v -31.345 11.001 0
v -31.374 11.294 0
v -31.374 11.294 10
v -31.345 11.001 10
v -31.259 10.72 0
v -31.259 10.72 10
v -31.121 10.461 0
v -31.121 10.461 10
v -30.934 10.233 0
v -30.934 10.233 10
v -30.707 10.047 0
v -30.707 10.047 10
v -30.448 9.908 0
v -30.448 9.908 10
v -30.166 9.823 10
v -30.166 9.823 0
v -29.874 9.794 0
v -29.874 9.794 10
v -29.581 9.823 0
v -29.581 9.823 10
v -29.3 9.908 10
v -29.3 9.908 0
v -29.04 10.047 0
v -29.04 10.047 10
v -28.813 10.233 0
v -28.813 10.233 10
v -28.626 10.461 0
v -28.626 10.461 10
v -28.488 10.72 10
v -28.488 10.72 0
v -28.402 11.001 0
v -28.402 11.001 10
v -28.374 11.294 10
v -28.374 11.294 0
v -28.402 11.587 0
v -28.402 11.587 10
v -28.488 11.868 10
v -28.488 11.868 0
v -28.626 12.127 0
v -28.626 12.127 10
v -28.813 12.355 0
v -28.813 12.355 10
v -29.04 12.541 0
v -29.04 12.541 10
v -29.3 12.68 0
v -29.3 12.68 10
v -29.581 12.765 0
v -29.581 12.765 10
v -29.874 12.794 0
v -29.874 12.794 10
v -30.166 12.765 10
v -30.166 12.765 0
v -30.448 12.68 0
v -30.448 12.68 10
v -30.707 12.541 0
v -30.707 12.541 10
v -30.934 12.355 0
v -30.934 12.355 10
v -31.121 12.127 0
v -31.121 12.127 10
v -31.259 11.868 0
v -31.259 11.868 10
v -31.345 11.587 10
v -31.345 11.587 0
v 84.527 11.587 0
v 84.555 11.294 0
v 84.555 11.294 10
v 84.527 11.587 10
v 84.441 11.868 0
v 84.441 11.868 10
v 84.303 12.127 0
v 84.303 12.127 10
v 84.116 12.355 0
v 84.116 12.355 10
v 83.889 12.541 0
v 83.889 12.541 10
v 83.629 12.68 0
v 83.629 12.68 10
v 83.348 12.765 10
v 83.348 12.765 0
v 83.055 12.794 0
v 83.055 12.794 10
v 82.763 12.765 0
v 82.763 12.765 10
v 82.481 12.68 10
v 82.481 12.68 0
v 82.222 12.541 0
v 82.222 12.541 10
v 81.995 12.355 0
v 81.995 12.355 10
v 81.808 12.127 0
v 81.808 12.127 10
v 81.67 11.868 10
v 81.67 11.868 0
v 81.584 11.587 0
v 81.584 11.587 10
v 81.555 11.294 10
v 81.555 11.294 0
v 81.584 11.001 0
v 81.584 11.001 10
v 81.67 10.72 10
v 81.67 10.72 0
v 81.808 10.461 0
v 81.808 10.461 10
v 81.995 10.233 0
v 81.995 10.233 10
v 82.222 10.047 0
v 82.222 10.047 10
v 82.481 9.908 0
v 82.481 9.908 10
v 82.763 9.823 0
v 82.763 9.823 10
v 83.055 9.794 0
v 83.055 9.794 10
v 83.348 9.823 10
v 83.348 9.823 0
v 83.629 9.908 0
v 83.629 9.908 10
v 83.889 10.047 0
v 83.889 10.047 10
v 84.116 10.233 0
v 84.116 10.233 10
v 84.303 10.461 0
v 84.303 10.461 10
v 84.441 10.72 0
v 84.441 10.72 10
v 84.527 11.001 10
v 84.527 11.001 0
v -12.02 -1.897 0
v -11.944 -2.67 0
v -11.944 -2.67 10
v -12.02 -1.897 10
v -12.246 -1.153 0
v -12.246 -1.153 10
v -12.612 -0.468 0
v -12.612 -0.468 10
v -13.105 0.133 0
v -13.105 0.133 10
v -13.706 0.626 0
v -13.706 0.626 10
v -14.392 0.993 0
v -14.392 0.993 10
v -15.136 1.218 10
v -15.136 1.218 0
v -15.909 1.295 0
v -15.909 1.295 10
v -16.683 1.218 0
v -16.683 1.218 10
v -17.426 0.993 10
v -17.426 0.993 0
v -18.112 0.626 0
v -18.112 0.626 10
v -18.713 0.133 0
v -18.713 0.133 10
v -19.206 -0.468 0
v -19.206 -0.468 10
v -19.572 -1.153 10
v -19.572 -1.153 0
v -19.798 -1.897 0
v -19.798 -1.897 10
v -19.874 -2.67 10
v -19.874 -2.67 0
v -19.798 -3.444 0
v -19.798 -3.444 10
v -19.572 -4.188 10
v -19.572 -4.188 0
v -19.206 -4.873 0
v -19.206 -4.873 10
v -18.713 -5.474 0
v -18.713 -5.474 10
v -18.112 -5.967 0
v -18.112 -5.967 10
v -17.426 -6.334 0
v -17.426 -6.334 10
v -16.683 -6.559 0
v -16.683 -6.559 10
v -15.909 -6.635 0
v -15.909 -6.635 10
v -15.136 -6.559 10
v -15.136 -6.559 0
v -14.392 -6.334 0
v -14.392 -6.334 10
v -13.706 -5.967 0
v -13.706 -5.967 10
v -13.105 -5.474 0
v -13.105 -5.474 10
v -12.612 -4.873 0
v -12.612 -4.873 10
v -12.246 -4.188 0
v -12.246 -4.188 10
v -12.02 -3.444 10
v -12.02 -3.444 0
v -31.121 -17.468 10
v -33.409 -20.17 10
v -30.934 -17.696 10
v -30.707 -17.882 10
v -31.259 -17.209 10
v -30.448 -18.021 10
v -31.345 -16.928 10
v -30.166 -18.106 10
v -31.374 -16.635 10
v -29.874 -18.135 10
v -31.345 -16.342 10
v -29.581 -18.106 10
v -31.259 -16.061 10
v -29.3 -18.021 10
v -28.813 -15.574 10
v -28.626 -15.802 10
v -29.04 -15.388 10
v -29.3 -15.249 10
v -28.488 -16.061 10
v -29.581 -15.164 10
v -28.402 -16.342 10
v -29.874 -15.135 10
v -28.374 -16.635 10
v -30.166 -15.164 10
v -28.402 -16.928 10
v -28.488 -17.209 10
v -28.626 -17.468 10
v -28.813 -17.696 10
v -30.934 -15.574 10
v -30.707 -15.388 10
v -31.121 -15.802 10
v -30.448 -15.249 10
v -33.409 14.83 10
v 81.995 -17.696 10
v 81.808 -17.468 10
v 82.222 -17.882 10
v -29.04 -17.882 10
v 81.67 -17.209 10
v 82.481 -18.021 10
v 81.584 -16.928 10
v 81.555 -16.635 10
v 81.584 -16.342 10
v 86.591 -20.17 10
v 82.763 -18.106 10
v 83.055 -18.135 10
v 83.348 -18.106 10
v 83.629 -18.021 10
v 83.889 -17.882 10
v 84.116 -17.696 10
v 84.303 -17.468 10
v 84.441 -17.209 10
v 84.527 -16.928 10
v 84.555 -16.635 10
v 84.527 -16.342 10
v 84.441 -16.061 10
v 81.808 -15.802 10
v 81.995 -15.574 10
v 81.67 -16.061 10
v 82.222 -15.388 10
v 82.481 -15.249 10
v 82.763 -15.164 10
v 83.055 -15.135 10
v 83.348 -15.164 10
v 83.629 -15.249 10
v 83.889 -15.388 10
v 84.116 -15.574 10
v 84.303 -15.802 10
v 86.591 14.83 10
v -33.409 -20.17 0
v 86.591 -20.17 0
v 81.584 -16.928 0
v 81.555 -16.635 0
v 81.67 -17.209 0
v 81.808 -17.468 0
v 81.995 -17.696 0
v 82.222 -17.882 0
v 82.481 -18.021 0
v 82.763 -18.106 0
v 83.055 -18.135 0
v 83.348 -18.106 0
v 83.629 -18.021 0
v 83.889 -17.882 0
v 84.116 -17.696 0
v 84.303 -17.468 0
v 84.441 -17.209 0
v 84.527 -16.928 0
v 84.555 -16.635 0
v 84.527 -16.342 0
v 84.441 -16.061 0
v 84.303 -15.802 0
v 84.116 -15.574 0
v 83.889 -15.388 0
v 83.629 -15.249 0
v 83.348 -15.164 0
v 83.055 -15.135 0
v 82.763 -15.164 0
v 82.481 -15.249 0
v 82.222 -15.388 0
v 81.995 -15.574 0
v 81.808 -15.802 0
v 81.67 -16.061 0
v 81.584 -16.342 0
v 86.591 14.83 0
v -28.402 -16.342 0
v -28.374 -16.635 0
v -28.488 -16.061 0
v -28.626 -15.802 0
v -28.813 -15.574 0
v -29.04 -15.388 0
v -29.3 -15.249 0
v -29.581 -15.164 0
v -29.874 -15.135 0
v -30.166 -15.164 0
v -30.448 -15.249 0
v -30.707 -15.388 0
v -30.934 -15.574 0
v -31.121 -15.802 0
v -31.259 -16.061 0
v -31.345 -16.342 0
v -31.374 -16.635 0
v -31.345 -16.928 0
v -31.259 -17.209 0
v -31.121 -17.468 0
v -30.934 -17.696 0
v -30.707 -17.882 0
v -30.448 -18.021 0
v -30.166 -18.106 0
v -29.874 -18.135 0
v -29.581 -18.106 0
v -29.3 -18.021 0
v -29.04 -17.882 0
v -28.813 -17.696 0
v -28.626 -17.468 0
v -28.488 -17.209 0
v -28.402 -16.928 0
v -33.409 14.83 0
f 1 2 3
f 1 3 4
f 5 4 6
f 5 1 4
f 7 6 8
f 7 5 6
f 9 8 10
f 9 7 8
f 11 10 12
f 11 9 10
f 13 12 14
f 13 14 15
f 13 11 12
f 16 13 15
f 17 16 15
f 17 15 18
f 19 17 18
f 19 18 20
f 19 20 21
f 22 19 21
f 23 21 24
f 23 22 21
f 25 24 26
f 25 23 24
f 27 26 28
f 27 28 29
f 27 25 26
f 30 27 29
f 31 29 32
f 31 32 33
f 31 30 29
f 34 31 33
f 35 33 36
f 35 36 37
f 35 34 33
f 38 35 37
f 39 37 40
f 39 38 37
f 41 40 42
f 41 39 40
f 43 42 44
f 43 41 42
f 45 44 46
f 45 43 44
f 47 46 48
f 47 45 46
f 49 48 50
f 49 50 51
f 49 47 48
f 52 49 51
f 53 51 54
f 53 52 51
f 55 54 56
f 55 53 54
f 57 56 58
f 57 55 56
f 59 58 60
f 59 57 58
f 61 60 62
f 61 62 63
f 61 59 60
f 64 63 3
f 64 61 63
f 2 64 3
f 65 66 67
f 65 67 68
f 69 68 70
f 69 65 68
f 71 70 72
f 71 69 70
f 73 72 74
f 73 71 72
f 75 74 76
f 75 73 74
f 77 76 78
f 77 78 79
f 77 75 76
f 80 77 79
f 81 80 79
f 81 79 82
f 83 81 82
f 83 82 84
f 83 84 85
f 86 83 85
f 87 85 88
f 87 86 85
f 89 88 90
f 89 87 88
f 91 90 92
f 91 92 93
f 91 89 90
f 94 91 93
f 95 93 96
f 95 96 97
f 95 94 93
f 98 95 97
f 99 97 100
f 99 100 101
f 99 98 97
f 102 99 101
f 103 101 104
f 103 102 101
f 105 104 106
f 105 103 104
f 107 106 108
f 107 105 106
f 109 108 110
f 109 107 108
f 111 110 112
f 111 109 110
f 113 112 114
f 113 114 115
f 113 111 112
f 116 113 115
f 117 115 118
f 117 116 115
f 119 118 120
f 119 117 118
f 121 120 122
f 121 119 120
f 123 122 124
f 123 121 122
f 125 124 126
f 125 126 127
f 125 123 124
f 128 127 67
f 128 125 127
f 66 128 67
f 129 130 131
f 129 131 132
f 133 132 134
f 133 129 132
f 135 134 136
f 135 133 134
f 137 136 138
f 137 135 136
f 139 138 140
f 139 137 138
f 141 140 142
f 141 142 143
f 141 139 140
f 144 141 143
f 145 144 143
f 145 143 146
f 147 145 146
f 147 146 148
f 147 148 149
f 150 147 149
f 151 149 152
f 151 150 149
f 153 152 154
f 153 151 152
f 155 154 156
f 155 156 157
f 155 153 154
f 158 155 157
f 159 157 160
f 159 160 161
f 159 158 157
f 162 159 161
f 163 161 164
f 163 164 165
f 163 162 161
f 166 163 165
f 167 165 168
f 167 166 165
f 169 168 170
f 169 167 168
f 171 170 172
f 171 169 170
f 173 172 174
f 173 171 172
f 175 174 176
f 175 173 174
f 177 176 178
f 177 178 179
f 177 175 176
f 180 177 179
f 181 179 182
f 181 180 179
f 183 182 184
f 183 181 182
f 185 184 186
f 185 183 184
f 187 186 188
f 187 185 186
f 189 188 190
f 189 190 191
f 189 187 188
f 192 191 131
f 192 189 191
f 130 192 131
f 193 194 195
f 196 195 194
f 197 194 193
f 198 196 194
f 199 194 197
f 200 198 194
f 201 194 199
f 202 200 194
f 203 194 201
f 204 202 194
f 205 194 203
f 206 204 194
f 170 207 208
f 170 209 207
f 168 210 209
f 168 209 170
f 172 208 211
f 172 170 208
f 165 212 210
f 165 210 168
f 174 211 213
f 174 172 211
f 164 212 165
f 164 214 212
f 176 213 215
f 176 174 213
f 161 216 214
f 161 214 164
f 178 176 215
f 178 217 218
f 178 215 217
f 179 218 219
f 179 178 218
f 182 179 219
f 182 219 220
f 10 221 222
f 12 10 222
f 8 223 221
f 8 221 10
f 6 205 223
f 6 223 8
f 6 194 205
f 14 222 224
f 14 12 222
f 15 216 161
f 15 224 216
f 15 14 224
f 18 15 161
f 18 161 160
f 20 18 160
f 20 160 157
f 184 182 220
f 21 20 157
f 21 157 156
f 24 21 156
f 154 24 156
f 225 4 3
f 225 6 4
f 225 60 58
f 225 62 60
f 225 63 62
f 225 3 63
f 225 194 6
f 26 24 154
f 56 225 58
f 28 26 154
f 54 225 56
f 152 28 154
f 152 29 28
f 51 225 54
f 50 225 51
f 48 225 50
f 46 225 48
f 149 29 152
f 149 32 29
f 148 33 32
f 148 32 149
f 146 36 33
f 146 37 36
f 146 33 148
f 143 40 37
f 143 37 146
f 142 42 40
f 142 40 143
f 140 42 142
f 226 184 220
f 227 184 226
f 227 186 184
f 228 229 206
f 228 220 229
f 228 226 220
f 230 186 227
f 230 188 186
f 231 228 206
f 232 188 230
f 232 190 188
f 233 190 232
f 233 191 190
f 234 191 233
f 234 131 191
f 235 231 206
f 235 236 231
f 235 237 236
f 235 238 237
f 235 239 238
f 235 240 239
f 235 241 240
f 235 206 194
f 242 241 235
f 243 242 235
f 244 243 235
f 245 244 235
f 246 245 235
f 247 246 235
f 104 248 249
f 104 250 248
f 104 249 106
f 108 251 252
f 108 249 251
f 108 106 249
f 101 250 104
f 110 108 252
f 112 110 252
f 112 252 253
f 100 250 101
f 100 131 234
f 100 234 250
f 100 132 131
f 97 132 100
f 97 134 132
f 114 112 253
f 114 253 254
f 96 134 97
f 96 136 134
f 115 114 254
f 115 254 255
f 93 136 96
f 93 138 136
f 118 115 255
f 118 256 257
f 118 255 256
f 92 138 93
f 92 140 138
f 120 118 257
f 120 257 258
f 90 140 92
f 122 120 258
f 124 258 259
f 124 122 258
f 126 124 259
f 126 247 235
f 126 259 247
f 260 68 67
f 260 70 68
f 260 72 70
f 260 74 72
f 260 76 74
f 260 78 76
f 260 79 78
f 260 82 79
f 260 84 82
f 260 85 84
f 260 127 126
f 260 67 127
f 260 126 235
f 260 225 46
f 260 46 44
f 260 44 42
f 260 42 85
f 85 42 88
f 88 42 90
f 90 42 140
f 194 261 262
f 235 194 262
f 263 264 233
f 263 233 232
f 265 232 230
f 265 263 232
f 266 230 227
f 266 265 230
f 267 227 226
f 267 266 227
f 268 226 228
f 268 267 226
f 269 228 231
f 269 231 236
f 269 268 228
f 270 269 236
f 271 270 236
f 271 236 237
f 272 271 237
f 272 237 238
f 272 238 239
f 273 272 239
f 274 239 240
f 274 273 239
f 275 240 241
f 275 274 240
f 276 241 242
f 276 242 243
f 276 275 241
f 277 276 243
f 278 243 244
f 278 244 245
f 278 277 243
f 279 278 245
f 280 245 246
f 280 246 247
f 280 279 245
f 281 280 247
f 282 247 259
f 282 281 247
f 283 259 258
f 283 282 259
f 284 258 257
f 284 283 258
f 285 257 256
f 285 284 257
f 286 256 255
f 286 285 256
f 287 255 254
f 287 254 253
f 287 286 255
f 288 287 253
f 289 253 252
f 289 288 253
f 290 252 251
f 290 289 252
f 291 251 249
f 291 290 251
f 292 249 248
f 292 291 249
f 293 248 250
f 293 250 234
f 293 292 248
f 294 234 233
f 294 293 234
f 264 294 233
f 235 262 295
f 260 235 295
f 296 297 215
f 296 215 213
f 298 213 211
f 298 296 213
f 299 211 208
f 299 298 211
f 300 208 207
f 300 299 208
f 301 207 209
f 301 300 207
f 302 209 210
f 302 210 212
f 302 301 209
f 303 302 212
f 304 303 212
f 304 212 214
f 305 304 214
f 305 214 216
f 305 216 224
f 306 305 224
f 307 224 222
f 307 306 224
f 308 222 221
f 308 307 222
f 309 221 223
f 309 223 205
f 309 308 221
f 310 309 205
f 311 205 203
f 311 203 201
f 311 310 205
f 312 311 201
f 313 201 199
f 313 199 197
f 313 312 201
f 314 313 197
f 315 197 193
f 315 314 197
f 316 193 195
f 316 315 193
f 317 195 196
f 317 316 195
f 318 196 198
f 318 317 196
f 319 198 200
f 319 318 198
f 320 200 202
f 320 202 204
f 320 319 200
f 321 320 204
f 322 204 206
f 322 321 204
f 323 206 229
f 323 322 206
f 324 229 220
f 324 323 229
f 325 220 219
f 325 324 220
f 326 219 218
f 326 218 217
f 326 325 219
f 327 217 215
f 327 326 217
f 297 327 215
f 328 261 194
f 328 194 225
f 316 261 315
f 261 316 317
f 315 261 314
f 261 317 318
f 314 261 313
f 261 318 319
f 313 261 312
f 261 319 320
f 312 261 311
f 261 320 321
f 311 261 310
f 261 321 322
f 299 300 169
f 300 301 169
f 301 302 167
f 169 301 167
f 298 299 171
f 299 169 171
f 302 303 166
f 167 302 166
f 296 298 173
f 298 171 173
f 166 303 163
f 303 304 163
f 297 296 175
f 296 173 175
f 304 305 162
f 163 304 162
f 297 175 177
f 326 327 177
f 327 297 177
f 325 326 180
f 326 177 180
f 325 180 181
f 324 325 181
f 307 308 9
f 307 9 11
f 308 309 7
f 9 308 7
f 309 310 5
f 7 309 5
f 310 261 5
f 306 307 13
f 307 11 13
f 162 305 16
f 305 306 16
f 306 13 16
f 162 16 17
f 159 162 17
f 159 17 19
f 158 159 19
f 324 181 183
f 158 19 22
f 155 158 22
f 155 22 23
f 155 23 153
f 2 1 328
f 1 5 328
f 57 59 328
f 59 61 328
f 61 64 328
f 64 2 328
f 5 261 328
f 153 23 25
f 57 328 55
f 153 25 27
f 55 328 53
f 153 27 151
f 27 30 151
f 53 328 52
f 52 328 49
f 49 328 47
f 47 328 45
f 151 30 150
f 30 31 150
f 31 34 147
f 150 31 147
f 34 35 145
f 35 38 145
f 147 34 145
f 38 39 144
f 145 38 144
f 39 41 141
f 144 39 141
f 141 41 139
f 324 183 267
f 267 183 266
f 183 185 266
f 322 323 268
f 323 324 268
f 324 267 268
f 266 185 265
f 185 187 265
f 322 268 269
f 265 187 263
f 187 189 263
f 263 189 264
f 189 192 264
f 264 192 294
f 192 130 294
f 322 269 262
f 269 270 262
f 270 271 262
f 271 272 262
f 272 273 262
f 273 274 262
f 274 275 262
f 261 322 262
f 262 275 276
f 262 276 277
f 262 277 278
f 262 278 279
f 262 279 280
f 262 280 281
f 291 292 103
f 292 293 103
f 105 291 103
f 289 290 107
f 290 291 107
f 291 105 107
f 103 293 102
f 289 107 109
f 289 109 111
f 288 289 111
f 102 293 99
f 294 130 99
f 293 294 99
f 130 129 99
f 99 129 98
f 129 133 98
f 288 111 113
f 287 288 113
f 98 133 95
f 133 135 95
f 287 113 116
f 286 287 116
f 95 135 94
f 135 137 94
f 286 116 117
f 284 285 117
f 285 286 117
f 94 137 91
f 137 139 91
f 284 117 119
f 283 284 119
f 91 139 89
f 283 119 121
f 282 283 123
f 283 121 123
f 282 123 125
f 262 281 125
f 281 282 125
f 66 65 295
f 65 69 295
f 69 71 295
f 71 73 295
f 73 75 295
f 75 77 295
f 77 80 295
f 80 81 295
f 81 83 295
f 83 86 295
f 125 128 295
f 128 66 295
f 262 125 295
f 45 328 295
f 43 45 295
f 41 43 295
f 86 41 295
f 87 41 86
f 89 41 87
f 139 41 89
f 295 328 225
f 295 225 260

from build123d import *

# Parameters (mm, degrees)
SKETCH2_W           = 120
SKETCH2_H           = 35
SKETCH2_R           = 1.5
SKETCH2_R_2         = 3.965
BOSS_EXTRUDE1_DEPTH = 10


with BuildPart() as part:
    # Sketch2 → Boss-Extrude1 (new body)
    with BuildSketch(Plane.XY):
        with Locations((26.590909091, -2.670454545)):
            Rectangle(SKETCH2_W, SKETCH2_H)
        with Locations((-29.873557003, -16.63492064)):
            Circle(SKETCH2_R, mode=Mode.SUBTRACT)
        with Locations((-15.909090909, -2.670454545)):
            Circle(SKETCH2_R_2, mode=Mode.SUBTRACT)
        with Locations((83.055375185, 11.294011549)):
            Circle(SKETCH2_R, mode=Mode.SUBTRACT)
        with Locations(Location((-29.873557003, 11.294011549, 0), (0, 0, 180))):
            Circle(SKETCH2_R, mode=Mode.SUBTRACT)
        with Locations(Location((83.055375185, -16.63492064, 0), (0, 0, 180))):
            Circle(SKETCH2_R, mode=Mode.SUBTRACT)
    extrude(amount=BOSS_EXTRUDE1_DEPTH)


solid = part.part
